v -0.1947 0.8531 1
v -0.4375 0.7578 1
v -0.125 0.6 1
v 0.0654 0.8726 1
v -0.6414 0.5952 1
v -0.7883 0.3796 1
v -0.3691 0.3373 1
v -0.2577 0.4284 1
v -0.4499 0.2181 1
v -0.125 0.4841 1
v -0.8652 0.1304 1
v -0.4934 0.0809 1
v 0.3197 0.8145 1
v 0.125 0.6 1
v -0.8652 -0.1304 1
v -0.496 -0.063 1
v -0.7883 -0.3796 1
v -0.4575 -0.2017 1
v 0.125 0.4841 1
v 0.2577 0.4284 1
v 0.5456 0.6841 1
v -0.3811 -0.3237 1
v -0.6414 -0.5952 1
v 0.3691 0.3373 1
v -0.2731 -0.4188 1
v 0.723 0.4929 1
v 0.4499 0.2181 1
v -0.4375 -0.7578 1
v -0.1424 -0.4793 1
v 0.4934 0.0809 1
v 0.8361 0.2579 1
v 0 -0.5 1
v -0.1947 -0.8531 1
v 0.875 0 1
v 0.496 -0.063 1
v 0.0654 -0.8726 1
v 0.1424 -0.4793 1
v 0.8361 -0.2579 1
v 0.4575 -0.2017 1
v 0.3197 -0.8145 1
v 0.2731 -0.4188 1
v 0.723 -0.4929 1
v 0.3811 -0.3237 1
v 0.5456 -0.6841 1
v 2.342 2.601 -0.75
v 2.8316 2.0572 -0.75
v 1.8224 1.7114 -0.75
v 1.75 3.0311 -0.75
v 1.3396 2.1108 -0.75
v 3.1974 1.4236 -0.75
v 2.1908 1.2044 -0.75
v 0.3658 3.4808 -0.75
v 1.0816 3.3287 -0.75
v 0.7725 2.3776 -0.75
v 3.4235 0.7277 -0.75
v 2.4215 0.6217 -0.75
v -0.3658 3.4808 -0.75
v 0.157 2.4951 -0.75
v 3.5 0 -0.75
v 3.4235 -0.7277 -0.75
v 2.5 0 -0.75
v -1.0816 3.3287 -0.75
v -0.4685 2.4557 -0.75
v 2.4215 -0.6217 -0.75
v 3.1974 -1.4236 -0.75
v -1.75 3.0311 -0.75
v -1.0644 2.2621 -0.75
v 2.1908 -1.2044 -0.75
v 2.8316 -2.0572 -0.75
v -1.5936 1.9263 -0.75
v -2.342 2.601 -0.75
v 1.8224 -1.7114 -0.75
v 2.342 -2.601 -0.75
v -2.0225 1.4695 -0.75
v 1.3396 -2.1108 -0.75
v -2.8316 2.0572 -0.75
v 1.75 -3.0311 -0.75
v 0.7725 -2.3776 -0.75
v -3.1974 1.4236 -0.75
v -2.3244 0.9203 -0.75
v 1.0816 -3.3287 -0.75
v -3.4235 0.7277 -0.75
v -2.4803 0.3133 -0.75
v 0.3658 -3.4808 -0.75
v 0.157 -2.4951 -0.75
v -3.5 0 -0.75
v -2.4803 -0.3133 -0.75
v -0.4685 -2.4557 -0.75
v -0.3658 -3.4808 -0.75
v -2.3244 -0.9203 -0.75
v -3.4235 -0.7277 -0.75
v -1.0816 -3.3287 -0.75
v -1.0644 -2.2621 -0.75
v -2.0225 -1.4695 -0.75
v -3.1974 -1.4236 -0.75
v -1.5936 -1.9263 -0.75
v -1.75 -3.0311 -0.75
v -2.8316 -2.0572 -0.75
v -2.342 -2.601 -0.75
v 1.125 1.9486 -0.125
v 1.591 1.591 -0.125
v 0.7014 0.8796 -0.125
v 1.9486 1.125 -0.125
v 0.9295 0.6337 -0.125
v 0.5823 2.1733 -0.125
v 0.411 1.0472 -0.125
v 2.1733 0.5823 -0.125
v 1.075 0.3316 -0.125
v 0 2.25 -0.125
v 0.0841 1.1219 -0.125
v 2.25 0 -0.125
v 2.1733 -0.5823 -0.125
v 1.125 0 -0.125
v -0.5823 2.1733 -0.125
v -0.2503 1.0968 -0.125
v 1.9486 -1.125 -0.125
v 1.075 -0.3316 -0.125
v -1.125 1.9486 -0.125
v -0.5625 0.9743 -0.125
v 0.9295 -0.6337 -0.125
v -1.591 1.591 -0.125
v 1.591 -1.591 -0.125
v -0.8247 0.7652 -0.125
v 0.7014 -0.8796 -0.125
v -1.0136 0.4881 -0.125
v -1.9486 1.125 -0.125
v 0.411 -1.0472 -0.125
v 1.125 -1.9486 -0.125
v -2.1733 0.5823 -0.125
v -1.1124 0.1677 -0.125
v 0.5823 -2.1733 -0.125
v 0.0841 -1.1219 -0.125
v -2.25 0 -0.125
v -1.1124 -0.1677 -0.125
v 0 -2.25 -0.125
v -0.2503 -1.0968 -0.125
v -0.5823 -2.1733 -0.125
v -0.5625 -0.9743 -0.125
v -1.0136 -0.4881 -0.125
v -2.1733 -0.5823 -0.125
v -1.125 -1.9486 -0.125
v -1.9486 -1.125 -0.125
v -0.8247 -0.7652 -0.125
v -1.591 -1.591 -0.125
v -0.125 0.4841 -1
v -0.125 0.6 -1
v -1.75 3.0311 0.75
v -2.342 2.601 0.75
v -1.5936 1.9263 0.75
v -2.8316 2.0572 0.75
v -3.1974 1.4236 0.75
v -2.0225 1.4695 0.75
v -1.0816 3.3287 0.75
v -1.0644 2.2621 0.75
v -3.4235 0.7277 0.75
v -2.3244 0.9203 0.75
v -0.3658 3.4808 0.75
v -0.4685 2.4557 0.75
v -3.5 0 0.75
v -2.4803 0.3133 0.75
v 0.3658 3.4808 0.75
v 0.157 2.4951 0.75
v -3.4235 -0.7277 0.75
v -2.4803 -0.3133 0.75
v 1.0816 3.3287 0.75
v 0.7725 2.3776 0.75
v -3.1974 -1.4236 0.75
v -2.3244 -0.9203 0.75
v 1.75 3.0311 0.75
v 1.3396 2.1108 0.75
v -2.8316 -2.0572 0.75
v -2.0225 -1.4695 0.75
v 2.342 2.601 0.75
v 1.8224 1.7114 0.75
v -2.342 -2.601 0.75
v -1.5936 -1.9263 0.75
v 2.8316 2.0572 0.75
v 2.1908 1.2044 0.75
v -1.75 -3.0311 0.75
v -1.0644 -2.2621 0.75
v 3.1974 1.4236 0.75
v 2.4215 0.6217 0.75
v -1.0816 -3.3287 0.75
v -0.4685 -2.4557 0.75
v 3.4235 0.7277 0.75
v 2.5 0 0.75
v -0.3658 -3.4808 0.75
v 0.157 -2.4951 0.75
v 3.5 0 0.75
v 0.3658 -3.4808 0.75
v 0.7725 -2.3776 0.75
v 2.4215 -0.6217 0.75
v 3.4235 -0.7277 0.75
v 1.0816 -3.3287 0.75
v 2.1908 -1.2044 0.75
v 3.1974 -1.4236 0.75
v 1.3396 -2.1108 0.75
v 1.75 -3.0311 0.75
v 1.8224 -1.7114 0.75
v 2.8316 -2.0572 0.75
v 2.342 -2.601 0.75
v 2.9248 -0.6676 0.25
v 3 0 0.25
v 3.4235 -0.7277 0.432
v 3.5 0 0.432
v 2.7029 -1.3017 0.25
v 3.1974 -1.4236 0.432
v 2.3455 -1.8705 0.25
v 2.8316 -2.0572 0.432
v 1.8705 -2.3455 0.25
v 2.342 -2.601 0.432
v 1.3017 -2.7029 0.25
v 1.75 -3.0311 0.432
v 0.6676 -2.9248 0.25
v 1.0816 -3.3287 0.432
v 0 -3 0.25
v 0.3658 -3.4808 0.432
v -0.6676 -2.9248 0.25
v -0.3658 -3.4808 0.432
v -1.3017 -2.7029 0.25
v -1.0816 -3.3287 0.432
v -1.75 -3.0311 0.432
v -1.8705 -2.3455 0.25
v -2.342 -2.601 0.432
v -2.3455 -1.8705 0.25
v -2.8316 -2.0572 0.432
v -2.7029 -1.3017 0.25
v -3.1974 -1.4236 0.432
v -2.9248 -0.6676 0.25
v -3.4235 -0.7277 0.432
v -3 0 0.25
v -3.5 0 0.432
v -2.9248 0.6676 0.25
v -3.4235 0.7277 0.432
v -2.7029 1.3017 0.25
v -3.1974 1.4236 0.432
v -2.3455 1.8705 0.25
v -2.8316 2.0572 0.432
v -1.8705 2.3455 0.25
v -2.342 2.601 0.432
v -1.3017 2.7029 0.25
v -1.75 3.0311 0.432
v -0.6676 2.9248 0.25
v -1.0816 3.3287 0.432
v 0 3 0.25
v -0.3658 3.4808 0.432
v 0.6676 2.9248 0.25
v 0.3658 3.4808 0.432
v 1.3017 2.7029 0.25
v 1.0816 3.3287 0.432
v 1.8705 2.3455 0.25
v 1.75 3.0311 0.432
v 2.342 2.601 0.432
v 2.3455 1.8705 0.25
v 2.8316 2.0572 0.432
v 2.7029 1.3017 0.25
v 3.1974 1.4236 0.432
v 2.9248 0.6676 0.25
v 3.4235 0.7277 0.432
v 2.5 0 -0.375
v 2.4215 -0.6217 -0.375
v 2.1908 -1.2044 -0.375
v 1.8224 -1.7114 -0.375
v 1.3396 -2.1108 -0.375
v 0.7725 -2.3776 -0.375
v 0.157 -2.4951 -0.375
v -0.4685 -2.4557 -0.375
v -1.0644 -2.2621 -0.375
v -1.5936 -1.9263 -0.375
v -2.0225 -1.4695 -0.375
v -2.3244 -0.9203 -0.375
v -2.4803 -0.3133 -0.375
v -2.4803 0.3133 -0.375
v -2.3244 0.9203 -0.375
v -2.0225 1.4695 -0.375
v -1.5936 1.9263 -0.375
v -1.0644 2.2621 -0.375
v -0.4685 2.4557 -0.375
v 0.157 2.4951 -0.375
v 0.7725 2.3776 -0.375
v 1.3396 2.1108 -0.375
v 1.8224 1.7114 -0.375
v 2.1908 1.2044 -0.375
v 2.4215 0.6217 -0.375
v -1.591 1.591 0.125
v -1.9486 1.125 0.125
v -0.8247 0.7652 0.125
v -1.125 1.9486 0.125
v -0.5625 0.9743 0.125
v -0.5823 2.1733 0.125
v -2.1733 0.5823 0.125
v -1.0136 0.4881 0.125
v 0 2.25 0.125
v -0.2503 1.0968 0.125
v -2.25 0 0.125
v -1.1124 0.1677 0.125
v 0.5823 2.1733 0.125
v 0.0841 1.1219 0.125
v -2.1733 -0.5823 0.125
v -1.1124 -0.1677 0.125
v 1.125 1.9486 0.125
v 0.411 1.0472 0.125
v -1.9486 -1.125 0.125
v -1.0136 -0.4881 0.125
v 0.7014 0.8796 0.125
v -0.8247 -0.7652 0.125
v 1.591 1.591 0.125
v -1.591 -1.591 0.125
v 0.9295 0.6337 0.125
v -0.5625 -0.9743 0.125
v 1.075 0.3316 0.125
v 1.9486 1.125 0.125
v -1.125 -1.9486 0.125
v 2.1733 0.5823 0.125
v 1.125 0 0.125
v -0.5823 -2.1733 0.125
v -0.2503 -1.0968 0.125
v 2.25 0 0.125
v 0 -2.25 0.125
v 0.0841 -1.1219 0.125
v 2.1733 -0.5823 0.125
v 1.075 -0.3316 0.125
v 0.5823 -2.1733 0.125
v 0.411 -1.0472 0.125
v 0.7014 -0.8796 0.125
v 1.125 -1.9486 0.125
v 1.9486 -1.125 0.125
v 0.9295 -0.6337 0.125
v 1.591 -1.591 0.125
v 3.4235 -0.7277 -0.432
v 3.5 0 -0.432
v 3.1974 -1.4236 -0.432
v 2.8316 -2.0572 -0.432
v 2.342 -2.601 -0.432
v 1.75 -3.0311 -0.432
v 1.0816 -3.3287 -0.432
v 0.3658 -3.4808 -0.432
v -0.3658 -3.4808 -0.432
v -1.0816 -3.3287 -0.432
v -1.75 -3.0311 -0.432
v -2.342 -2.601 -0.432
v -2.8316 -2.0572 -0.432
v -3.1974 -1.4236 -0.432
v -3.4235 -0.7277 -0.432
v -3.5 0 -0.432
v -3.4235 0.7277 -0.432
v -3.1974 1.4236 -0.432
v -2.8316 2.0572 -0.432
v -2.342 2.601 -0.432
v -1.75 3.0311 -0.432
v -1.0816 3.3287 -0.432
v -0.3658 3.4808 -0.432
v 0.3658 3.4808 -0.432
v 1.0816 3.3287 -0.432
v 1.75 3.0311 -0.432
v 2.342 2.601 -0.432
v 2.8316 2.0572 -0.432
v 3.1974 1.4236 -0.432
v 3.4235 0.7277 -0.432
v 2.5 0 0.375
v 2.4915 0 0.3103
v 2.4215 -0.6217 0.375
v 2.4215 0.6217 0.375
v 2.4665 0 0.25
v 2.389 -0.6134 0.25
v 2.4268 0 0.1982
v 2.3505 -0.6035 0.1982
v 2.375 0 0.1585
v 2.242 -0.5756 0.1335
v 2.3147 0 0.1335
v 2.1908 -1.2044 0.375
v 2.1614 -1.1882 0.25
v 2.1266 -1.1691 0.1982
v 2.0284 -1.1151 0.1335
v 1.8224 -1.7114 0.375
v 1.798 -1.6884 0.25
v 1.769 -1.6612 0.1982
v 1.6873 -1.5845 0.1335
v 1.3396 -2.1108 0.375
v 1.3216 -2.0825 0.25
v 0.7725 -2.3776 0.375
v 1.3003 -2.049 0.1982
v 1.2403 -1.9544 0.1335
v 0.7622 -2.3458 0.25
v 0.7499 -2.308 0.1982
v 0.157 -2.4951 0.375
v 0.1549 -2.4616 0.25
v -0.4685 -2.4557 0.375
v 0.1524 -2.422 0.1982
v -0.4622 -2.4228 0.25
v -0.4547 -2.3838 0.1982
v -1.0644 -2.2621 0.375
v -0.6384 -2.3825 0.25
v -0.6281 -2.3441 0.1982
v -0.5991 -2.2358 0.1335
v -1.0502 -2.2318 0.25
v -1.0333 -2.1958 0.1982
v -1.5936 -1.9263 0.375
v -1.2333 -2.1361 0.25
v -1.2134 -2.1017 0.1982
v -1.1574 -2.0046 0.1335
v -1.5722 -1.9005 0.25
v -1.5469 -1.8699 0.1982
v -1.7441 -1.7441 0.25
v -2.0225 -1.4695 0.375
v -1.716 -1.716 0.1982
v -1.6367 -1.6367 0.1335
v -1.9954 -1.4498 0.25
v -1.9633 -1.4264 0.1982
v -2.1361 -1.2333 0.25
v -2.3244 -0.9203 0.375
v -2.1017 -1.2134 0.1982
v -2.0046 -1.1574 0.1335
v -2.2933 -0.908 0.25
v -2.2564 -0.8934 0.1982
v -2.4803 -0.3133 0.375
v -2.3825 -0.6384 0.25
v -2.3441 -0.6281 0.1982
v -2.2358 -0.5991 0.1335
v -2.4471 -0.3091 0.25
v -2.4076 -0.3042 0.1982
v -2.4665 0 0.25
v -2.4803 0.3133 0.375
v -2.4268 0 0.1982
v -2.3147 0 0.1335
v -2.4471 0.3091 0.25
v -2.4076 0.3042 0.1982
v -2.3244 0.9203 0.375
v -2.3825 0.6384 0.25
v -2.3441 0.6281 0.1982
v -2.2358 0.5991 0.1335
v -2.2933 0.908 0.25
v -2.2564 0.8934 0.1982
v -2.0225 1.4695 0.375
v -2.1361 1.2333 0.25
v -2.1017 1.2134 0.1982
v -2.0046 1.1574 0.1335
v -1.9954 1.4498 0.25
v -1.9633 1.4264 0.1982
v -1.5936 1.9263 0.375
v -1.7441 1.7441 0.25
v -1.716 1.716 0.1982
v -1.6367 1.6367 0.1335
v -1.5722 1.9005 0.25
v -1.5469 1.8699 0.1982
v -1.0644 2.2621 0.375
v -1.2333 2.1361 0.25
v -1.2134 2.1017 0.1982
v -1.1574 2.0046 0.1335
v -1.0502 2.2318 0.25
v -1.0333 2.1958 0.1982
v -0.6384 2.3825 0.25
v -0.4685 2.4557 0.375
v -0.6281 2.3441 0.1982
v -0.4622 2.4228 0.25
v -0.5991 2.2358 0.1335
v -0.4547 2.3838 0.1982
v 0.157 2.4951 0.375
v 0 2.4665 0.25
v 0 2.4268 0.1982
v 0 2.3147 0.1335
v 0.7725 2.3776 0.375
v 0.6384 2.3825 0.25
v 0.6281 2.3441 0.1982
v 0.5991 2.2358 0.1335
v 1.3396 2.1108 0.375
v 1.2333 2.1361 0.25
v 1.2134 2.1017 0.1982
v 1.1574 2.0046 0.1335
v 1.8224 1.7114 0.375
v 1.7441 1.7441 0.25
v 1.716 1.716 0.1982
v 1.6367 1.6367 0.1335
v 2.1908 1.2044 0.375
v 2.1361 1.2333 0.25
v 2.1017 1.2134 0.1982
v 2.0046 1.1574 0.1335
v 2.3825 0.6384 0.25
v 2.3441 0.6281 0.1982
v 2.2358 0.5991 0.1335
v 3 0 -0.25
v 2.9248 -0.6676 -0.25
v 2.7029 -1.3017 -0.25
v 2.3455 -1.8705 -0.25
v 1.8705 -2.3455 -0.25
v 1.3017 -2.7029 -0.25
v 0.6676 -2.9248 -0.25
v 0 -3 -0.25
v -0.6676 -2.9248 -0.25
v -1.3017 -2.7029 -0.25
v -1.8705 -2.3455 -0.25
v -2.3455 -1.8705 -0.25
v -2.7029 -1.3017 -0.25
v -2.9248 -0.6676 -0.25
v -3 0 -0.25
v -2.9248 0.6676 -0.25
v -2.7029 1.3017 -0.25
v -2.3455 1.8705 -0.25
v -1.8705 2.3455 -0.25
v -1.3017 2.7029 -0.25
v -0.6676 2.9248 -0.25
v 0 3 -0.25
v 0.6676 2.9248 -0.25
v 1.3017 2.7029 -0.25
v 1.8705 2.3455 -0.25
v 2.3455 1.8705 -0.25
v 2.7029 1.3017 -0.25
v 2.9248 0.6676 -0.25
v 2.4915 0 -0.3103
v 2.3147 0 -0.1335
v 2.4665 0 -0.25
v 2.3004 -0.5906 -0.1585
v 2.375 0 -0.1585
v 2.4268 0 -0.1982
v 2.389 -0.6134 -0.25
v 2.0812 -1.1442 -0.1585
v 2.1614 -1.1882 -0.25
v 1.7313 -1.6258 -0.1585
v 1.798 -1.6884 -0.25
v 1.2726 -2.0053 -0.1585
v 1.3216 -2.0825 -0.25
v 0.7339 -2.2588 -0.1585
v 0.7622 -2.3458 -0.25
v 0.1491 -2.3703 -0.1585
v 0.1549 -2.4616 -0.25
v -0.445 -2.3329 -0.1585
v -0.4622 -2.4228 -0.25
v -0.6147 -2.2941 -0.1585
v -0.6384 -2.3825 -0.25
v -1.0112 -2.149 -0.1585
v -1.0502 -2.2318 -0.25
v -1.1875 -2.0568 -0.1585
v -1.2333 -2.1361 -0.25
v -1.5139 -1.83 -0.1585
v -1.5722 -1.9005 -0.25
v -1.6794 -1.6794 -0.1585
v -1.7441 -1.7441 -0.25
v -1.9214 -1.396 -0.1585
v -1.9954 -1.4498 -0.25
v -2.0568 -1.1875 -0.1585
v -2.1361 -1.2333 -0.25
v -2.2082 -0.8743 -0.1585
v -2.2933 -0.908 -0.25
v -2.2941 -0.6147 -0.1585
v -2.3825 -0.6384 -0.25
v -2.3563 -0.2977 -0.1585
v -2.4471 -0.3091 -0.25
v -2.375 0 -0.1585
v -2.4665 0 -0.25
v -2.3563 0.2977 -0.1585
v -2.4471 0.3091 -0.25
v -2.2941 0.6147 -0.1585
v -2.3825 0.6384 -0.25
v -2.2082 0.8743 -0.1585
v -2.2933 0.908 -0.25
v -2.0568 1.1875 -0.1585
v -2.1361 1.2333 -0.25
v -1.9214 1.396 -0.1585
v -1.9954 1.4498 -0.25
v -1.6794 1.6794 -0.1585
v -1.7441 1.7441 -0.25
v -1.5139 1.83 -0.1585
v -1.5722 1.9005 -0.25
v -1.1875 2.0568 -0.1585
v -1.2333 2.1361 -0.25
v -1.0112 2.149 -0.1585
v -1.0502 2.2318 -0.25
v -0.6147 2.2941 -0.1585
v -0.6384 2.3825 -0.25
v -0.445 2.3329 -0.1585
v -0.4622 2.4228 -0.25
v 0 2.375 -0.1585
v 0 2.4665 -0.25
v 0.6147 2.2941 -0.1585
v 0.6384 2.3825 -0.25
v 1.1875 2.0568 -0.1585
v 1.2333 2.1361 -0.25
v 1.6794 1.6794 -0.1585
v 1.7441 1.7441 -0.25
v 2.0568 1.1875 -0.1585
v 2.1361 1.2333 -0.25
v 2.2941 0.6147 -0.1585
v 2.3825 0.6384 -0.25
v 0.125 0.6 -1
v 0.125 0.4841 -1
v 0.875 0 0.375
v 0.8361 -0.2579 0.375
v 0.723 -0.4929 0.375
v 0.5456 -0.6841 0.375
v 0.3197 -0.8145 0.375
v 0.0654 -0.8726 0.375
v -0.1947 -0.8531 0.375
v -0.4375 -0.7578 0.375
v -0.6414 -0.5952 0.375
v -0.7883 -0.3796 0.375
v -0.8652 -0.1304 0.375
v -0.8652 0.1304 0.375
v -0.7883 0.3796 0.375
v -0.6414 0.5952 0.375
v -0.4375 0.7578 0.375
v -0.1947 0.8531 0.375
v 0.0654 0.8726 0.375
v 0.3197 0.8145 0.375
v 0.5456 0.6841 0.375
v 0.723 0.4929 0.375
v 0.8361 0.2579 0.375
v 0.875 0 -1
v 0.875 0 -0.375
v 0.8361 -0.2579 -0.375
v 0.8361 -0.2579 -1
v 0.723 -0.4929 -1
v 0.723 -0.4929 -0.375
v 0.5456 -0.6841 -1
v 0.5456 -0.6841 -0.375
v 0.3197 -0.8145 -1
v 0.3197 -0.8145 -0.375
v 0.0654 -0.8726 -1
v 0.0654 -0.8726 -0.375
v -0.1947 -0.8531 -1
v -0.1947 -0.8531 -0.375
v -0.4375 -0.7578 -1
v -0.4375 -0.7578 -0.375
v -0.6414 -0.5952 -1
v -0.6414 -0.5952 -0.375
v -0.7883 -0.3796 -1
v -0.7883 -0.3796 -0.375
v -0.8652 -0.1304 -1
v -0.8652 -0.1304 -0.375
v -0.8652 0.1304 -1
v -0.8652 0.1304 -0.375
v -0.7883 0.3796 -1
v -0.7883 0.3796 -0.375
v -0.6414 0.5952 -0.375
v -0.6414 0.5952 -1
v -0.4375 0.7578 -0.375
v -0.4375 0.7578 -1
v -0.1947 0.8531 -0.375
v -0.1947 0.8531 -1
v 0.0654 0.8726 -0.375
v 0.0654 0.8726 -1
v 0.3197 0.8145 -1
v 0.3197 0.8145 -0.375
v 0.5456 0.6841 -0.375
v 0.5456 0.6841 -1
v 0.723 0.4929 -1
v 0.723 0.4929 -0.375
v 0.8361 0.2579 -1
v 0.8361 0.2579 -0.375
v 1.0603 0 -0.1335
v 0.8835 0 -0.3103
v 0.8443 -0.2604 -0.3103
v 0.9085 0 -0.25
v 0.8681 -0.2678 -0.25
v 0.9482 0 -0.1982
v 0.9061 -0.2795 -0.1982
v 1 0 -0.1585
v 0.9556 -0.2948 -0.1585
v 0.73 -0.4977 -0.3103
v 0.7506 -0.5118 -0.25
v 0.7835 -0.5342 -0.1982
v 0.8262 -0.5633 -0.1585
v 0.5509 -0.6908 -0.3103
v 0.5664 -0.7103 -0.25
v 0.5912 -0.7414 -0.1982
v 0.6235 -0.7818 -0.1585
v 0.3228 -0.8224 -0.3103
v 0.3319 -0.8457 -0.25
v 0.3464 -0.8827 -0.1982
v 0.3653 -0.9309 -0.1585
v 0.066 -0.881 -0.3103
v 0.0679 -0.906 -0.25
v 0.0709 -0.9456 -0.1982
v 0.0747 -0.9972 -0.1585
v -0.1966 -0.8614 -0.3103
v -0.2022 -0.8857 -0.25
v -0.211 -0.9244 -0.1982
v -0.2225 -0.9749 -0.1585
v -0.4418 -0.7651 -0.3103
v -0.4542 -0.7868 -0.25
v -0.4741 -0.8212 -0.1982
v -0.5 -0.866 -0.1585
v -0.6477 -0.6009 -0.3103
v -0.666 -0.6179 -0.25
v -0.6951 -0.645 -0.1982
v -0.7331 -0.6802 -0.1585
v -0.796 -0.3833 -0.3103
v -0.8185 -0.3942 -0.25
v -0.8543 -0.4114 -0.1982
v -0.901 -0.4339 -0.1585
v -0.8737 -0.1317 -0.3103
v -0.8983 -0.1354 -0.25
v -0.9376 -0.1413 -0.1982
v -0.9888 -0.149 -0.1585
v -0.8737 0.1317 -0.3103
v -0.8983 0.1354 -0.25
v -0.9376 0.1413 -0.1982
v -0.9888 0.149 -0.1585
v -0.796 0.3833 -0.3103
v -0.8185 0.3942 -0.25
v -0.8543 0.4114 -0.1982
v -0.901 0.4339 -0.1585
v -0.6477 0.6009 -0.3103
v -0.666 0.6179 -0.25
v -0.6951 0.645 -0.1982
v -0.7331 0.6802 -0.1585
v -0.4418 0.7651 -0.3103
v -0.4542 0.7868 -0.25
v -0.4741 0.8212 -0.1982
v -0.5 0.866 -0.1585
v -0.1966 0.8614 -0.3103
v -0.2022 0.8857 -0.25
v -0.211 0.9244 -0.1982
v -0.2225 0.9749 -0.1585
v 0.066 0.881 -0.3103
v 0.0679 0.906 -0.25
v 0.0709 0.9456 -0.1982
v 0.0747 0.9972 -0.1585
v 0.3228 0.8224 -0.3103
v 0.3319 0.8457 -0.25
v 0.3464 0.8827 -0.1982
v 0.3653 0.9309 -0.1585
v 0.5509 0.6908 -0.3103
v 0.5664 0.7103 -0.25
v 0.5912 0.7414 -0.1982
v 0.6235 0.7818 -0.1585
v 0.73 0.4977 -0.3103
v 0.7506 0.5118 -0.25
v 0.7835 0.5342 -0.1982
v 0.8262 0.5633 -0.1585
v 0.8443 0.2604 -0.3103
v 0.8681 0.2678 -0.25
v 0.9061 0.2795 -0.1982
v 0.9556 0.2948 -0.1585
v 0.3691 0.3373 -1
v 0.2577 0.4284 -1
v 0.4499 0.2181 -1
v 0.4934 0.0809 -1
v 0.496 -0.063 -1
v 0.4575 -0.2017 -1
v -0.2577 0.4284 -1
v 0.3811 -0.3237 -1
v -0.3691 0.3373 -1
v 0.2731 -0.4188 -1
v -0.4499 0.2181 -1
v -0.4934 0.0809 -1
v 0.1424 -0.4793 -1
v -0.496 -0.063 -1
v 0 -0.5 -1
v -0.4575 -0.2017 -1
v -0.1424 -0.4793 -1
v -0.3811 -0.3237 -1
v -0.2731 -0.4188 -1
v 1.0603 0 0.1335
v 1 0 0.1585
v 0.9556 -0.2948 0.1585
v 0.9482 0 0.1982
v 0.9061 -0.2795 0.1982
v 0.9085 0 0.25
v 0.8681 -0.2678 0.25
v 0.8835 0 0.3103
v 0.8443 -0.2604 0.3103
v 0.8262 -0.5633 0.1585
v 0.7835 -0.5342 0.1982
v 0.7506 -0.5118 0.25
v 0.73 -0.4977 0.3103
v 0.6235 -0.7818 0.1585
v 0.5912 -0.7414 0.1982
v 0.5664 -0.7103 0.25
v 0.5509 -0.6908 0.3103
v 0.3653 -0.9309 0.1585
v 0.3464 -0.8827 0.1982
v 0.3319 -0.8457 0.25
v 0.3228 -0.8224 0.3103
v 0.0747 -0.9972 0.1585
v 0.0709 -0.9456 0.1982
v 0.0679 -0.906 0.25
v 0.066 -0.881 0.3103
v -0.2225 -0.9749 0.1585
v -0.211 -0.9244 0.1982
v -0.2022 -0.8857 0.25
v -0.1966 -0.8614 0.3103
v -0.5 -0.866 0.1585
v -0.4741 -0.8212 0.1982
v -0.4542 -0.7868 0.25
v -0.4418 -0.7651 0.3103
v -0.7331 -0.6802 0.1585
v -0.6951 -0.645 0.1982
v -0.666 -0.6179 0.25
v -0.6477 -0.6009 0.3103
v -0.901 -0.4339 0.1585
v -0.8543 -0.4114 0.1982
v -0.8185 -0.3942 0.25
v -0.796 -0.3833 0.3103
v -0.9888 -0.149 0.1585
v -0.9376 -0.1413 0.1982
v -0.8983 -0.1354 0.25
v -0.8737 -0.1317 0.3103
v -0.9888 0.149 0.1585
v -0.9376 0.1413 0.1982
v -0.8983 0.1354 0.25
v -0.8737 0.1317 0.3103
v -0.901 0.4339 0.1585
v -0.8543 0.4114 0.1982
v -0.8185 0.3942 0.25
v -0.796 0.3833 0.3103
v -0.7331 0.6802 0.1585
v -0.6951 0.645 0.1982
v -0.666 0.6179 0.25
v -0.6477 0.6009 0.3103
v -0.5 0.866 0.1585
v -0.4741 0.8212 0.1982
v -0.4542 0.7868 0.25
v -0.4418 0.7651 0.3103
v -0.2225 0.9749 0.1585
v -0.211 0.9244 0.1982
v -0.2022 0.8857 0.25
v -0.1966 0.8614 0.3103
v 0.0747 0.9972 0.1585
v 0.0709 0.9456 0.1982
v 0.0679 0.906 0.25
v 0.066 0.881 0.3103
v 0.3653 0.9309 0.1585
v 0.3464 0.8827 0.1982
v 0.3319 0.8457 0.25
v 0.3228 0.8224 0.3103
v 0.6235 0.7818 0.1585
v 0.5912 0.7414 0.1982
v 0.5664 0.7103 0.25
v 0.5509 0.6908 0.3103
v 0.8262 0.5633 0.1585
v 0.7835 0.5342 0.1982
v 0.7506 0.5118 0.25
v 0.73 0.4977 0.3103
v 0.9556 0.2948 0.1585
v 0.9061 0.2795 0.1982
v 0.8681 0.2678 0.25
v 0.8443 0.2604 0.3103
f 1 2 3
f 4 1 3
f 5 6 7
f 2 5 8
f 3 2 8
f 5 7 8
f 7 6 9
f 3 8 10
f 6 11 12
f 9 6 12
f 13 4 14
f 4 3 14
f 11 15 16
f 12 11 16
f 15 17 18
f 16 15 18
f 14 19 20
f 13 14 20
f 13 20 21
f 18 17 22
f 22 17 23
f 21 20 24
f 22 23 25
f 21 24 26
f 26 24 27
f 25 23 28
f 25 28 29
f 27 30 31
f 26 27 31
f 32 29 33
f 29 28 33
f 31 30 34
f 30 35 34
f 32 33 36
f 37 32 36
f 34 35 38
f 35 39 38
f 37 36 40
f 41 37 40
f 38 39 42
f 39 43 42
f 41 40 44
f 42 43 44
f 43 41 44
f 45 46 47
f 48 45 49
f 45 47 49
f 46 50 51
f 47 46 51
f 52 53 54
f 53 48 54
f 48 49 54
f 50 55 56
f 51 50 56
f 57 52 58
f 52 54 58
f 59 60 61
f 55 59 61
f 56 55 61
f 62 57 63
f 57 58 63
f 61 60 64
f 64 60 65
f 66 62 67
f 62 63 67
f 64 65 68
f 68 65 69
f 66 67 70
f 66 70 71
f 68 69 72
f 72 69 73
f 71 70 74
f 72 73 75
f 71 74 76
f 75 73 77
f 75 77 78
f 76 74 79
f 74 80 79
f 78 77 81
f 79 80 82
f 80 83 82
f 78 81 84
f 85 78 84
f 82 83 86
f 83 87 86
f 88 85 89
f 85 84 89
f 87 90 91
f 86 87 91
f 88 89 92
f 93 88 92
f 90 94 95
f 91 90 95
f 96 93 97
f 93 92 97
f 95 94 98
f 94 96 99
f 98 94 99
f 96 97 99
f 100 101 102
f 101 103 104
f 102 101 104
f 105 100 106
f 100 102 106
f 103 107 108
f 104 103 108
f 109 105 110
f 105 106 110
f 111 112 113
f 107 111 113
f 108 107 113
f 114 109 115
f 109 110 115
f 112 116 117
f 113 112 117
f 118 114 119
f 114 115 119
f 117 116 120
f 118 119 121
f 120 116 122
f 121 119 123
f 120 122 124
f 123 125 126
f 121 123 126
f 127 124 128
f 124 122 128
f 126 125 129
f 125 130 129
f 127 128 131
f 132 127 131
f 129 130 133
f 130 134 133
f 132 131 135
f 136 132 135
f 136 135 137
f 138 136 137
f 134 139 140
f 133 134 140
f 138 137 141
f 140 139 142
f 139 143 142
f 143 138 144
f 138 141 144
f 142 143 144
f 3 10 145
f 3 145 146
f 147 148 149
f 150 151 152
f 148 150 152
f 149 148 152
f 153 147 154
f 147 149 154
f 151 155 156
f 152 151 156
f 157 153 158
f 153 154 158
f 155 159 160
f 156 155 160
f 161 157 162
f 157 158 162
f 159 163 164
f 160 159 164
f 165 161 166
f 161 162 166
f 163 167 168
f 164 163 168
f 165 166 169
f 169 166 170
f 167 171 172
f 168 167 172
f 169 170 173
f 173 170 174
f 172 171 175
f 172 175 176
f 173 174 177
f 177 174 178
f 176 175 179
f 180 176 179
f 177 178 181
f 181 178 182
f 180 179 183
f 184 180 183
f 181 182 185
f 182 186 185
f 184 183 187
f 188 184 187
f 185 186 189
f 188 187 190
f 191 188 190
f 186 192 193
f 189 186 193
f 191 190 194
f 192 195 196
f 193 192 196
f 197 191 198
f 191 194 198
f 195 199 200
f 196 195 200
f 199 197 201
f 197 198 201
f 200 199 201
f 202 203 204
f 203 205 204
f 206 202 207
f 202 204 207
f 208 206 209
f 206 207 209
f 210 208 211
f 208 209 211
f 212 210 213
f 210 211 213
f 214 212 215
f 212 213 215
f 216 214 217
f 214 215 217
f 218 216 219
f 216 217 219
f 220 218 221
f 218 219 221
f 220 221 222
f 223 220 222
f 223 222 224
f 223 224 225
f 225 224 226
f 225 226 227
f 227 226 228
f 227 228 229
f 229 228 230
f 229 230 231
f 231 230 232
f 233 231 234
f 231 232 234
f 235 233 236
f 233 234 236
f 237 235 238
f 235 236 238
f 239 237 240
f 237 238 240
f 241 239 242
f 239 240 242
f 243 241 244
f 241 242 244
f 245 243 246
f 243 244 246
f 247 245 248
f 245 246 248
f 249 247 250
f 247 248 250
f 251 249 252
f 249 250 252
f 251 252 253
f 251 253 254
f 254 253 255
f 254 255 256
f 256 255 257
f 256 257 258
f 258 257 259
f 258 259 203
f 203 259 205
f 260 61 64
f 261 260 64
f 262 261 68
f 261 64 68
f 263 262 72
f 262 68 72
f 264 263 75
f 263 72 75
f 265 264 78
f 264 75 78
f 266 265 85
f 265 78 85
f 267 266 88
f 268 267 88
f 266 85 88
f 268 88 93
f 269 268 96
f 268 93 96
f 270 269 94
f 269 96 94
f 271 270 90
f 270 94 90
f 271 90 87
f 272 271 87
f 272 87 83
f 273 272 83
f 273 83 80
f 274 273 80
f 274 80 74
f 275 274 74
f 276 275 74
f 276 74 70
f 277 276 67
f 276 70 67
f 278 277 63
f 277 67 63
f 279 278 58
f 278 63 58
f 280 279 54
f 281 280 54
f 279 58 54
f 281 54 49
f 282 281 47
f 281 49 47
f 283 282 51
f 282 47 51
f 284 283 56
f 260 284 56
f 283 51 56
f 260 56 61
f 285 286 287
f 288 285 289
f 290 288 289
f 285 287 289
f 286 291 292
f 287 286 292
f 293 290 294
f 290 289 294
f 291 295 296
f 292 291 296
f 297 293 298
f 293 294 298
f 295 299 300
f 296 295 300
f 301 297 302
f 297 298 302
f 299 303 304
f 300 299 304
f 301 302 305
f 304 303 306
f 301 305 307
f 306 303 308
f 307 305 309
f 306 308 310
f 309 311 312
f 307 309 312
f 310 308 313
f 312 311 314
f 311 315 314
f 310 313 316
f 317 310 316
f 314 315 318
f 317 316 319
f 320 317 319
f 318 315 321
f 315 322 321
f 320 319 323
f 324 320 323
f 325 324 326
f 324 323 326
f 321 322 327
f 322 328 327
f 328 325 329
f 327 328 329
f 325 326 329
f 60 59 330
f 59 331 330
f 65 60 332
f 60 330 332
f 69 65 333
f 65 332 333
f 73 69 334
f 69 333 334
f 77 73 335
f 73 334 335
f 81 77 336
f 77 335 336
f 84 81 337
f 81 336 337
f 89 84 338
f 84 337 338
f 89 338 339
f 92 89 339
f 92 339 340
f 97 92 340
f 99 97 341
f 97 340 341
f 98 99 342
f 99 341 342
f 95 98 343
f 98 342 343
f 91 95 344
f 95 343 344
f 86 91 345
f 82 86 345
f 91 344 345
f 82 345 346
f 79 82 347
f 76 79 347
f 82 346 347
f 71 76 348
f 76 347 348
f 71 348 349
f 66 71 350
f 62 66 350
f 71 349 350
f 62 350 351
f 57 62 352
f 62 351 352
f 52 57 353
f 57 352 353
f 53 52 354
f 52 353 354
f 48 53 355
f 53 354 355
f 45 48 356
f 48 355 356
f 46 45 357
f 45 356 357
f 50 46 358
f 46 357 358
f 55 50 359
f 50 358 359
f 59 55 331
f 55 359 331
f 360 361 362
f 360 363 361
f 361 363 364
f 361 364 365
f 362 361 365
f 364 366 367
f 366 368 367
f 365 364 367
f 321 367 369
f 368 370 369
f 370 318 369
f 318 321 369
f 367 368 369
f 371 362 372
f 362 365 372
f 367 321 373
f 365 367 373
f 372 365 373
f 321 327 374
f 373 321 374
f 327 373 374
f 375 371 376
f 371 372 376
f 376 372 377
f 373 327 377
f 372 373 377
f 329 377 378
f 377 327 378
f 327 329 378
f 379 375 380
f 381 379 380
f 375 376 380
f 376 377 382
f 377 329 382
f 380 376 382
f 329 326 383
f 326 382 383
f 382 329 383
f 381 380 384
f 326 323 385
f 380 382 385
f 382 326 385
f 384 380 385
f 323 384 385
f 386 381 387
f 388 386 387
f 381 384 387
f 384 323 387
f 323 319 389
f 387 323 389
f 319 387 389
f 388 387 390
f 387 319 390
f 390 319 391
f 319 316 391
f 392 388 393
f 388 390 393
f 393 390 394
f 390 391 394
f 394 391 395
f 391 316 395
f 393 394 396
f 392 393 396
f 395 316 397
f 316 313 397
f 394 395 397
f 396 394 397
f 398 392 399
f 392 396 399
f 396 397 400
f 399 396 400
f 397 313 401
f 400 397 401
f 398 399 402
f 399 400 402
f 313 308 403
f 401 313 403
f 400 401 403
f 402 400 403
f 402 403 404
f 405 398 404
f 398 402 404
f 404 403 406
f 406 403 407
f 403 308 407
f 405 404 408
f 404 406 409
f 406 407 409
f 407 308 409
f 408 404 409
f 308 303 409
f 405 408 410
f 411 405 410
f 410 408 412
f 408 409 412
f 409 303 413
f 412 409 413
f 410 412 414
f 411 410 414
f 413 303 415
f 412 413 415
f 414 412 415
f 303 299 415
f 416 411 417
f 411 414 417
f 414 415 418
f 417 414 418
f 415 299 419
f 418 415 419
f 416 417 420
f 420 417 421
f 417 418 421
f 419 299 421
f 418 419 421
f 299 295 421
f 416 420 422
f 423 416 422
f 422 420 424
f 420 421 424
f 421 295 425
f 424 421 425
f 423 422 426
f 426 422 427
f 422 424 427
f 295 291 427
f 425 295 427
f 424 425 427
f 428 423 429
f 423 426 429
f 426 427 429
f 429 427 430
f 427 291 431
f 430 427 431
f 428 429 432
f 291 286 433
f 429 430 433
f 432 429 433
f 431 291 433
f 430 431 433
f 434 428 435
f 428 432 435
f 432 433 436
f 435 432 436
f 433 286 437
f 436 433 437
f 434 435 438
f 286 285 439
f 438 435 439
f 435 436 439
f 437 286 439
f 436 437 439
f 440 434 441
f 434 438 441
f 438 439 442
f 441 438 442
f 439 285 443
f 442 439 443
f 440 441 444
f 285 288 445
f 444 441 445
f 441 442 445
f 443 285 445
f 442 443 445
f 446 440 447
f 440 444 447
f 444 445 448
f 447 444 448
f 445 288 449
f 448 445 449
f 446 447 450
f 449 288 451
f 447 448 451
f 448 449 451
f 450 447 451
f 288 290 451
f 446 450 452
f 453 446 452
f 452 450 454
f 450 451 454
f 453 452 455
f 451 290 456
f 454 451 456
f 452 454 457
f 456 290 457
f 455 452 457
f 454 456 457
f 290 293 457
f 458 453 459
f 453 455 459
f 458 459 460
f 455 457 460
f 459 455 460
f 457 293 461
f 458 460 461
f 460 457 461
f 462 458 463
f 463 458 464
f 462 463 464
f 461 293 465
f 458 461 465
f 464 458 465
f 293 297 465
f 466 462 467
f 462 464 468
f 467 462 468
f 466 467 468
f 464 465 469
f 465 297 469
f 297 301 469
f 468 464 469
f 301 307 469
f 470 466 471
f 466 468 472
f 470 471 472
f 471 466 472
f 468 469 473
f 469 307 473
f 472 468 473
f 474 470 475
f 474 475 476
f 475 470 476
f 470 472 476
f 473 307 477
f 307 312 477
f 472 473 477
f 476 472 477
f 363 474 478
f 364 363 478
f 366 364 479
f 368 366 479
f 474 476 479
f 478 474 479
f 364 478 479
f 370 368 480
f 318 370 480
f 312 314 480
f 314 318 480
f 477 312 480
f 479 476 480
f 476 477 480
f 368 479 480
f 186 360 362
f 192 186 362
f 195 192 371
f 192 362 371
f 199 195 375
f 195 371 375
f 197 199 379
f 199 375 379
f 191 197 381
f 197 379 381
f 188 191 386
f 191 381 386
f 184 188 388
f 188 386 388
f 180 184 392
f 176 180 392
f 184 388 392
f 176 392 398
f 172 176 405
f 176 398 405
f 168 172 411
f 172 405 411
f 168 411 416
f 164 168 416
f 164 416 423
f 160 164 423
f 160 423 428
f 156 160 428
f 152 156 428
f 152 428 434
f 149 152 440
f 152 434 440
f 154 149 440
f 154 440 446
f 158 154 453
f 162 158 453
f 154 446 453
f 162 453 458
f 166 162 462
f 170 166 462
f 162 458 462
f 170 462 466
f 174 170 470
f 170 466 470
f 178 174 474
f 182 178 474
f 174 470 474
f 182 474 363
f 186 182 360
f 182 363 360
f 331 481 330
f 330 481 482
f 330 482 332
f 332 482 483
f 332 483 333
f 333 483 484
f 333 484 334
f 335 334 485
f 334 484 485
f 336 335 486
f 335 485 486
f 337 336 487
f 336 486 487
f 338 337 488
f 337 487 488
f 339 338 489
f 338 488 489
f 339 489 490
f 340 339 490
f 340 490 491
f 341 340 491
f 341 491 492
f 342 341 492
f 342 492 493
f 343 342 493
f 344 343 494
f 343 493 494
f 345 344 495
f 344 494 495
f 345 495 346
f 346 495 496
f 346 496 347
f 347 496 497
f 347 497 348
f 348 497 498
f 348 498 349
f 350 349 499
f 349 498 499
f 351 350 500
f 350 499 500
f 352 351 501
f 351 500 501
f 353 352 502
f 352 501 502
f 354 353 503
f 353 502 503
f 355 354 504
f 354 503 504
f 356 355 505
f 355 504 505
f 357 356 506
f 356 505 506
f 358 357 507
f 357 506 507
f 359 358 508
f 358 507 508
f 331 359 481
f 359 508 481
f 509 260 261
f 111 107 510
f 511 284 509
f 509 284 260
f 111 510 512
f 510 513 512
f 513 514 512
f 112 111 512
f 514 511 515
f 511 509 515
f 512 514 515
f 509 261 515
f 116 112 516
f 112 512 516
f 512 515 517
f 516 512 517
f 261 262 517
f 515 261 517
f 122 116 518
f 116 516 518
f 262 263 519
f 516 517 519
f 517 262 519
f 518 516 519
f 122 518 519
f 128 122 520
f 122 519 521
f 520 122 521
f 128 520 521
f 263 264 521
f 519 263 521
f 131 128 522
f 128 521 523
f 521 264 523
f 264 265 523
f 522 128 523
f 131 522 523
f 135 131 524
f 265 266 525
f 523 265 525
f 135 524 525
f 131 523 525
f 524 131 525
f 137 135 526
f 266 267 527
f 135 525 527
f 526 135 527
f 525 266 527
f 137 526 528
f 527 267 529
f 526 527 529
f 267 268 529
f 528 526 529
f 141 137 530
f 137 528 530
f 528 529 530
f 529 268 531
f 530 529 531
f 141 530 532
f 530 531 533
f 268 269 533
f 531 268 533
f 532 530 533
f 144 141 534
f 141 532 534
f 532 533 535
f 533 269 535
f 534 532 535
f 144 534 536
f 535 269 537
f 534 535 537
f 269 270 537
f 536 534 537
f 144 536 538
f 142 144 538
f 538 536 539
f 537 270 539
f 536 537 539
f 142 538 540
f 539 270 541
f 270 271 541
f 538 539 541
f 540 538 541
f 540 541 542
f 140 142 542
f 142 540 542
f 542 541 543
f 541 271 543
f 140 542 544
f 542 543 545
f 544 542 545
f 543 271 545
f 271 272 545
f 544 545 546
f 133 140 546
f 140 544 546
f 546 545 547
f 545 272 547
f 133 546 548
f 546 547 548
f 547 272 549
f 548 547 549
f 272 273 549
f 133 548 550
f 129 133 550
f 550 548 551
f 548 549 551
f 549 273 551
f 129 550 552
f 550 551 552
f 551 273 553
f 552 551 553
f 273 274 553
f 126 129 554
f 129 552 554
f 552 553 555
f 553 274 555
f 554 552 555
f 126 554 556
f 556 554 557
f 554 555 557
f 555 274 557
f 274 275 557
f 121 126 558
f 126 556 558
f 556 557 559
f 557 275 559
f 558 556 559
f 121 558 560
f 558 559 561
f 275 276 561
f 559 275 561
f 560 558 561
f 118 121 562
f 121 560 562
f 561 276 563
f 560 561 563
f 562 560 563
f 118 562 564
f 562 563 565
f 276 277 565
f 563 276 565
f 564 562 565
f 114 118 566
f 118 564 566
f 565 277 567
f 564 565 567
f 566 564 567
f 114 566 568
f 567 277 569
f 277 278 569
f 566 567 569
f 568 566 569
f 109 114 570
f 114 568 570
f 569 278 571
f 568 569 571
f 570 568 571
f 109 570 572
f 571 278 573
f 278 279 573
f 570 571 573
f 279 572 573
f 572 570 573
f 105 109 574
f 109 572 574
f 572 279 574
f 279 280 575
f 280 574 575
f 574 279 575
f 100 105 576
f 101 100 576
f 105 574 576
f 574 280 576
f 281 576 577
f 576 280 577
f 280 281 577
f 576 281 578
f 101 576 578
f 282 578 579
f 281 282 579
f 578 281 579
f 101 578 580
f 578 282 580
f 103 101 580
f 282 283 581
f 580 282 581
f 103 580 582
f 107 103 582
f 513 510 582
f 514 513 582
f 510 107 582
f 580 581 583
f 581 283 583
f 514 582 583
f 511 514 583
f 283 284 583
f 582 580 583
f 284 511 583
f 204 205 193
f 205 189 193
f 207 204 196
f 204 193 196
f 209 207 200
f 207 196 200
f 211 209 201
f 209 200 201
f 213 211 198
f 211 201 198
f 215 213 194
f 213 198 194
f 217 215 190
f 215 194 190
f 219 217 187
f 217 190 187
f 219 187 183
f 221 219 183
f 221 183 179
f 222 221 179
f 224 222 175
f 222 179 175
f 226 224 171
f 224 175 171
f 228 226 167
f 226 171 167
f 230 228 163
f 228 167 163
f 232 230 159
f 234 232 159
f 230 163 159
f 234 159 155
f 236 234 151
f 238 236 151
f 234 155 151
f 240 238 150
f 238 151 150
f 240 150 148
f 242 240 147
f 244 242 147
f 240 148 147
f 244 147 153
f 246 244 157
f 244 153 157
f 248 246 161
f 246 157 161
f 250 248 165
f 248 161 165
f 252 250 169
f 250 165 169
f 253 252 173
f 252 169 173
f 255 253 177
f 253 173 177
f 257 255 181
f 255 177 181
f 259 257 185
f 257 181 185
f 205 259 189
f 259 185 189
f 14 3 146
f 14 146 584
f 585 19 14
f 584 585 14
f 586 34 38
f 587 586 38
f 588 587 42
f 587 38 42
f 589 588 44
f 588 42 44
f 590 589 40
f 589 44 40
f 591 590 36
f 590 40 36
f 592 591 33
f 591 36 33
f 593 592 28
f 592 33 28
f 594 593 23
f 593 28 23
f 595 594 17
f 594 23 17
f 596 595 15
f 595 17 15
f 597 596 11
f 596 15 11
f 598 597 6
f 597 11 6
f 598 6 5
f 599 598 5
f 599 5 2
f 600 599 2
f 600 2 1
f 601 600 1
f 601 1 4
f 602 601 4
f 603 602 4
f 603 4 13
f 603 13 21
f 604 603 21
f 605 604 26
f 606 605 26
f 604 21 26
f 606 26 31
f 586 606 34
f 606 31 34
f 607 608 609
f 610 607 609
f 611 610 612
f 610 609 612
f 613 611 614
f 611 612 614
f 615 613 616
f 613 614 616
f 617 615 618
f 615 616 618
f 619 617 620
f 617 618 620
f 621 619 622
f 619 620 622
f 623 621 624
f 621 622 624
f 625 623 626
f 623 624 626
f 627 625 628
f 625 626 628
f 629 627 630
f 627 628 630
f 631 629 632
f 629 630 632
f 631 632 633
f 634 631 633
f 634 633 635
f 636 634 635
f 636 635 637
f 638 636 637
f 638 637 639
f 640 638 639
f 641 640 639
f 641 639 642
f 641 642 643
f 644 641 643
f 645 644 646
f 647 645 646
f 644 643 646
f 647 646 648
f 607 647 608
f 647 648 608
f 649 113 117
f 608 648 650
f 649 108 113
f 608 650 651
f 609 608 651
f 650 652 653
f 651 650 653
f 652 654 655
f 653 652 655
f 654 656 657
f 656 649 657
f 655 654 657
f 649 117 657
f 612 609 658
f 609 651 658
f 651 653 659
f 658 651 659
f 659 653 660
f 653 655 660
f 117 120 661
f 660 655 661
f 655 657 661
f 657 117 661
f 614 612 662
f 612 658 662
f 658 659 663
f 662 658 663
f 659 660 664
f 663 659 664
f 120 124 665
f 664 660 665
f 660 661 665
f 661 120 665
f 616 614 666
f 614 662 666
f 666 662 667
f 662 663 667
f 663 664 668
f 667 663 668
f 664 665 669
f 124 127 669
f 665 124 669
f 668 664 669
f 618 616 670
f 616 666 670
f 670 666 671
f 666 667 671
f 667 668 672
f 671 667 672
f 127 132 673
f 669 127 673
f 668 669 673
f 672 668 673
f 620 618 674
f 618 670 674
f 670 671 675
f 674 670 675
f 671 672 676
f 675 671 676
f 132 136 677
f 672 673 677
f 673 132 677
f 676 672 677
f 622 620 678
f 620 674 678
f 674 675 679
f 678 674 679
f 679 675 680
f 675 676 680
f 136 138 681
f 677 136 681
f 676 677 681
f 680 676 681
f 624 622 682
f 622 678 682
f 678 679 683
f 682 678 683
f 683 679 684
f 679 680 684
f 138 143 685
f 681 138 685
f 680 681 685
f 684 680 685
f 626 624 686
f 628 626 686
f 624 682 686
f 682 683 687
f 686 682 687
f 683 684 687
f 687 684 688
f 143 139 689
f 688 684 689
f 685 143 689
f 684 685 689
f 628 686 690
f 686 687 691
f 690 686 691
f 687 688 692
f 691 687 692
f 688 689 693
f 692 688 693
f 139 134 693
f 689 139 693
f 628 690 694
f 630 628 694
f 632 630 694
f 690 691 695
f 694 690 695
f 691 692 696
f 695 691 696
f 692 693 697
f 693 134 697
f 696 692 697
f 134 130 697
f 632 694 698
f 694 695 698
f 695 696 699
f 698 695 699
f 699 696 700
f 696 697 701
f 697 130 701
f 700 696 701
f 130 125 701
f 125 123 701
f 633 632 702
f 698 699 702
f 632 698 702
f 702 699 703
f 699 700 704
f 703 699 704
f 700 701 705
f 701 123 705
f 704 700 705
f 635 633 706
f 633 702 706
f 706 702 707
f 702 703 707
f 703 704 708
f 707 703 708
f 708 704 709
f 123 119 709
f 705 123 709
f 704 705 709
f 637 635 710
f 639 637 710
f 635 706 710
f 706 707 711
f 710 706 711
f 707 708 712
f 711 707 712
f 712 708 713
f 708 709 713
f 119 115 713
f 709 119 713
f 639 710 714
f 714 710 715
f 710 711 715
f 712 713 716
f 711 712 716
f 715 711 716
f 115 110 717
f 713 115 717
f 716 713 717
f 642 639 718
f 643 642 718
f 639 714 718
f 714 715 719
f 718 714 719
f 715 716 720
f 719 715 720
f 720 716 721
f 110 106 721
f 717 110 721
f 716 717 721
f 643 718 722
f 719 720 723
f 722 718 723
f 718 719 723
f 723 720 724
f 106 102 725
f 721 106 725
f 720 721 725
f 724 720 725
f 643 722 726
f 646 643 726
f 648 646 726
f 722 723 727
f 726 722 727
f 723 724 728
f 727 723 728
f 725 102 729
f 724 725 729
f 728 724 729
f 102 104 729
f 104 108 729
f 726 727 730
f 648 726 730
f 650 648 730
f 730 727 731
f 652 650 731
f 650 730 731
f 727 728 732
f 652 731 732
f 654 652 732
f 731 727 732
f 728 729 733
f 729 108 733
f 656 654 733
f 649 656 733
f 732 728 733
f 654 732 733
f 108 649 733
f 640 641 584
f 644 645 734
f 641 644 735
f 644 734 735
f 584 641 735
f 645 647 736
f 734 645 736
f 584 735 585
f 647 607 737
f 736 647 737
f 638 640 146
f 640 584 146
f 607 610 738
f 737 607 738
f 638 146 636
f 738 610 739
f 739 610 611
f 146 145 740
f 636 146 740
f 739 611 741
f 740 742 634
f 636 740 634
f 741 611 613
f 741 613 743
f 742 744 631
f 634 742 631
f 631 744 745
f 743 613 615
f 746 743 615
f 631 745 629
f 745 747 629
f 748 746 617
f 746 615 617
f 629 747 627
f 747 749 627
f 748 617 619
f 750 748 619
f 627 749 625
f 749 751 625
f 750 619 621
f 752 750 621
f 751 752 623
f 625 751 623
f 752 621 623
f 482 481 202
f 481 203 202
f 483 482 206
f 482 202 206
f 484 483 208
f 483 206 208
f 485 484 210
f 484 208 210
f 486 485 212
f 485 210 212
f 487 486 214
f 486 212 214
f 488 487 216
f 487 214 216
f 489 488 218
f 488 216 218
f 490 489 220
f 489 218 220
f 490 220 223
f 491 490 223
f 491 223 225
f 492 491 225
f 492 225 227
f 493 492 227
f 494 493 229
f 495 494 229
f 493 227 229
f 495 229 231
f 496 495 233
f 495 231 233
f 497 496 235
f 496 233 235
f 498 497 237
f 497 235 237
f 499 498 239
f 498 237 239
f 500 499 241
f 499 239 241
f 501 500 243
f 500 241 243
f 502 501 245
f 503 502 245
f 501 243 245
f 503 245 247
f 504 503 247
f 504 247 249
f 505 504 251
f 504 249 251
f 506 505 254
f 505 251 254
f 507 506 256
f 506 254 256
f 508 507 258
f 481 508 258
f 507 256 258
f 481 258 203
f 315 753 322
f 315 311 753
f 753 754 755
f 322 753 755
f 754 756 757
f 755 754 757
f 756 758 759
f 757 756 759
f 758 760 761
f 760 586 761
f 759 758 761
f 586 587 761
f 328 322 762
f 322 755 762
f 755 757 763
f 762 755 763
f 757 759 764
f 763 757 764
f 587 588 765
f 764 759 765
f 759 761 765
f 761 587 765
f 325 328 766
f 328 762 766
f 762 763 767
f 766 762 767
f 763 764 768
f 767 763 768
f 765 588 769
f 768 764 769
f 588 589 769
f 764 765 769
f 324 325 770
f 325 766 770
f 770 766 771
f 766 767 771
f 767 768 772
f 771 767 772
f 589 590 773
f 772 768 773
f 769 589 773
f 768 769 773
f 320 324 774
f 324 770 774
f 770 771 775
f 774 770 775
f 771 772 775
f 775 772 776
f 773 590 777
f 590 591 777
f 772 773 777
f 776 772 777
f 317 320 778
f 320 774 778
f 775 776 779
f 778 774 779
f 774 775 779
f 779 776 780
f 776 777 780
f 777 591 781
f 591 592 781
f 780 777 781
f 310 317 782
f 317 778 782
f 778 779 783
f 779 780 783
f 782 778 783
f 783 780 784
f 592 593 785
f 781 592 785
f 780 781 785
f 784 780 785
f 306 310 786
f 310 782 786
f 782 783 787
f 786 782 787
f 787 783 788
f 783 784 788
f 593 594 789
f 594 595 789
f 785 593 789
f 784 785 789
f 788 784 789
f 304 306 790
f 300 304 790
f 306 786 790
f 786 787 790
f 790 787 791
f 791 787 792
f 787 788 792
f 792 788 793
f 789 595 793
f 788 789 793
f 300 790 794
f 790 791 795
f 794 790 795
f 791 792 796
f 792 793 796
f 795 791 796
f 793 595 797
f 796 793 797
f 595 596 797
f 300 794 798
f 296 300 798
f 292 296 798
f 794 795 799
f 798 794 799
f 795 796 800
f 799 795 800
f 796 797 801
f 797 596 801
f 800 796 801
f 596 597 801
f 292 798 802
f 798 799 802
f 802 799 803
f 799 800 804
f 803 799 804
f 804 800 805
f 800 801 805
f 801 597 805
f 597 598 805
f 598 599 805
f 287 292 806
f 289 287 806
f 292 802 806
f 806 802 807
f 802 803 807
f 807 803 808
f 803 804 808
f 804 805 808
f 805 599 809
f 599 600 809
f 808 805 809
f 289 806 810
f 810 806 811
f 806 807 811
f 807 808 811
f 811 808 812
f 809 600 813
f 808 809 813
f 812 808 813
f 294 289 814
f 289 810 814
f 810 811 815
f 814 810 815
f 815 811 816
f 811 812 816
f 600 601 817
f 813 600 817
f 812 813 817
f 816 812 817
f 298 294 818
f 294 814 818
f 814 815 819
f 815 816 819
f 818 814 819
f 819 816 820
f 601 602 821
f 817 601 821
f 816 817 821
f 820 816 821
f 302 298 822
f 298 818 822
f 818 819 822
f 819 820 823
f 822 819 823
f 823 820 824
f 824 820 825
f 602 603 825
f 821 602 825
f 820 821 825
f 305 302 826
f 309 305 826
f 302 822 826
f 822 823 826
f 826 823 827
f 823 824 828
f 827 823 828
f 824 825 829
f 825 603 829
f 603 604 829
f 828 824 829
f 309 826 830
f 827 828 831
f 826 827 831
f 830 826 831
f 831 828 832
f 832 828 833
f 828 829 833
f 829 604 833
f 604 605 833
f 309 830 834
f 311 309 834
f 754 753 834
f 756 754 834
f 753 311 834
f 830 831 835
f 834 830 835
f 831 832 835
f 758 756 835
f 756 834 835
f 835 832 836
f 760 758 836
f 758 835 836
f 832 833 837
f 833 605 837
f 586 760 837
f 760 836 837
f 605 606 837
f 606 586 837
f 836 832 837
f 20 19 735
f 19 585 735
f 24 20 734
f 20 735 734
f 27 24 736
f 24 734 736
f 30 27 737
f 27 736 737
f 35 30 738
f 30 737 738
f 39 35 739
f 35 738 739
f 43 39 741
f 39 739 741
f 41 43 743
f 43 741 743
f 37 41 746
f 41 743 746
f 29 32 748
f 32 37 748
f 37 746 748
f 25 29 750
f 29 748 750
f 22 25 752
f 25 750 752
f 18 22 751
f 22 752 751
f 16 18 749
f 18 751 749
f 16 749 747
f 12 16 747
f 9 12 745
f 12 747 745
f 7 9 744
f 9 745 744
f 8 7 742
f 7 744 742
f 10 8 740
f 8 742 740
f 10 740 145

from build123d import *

# Parameters (mm, degrees)
FILLET1_R          = 0.25
SKETCH2_W          = 0.25
SKETCH2_H          = 0.25
CUT_EXTRUDE1_DEPTH = 6.338539126


with BuildPart() as part:
    # Sketch1 → Revolve1 (revolve)
    with BuildSketch(Plane(origin=(0, 0, 0), x_dir=(0, 0, -1), z_dir=(1, 0, 0)), mode=Mode.PRIVATE) as revolve1_sk:
        Polygon((-1, 0.5), (1, 0.5), (1, 0.875), (0.125, 0.875), (0.125, 2.5), (0.75, 2.5), (0.75, 3.5), (0.431985117, 3.5), (0.25, 3), (-0.25, 3), (-0.431985117, 3.5), (-0.75, 3.5), (-0.75, 2.5), (-0.125, 2.5), (-0.125, 0.875), (-1, 0.875), align=None)
    revolve(revolve1_sk.sketch.rotate(Axis((0, 0, 48.379703039), (0, 0, -1)), 90), axis=Axis((0, 0, 48.379703039), (0, 0, -1)))

    # Fillet1
    fillet1_edges = [part.edges().sort_by_distance(p)[0] for p in [
        (-0.875, 0, 0.125),
        (-2.5, 0, 0.125),
        (-2.5, 0, -0.125),
        (-0.875, 0, -0.125),
    ]]
    fillet(fillet1_edges, radius=FILLET1_R)

    # Sketch2 → Cut-Extrude1 (cut, through all)
    with BuildSketch(Plane.XY.offset(1)):
        with Locations((0, 0.475)):
            Rectangle(SKETCH2_W, SKETCH2_H)
    extrude(amount=-CUT_EXTRUDE1_DEPTH, mode=Mode.SUBTRACT)


solid = part.part
